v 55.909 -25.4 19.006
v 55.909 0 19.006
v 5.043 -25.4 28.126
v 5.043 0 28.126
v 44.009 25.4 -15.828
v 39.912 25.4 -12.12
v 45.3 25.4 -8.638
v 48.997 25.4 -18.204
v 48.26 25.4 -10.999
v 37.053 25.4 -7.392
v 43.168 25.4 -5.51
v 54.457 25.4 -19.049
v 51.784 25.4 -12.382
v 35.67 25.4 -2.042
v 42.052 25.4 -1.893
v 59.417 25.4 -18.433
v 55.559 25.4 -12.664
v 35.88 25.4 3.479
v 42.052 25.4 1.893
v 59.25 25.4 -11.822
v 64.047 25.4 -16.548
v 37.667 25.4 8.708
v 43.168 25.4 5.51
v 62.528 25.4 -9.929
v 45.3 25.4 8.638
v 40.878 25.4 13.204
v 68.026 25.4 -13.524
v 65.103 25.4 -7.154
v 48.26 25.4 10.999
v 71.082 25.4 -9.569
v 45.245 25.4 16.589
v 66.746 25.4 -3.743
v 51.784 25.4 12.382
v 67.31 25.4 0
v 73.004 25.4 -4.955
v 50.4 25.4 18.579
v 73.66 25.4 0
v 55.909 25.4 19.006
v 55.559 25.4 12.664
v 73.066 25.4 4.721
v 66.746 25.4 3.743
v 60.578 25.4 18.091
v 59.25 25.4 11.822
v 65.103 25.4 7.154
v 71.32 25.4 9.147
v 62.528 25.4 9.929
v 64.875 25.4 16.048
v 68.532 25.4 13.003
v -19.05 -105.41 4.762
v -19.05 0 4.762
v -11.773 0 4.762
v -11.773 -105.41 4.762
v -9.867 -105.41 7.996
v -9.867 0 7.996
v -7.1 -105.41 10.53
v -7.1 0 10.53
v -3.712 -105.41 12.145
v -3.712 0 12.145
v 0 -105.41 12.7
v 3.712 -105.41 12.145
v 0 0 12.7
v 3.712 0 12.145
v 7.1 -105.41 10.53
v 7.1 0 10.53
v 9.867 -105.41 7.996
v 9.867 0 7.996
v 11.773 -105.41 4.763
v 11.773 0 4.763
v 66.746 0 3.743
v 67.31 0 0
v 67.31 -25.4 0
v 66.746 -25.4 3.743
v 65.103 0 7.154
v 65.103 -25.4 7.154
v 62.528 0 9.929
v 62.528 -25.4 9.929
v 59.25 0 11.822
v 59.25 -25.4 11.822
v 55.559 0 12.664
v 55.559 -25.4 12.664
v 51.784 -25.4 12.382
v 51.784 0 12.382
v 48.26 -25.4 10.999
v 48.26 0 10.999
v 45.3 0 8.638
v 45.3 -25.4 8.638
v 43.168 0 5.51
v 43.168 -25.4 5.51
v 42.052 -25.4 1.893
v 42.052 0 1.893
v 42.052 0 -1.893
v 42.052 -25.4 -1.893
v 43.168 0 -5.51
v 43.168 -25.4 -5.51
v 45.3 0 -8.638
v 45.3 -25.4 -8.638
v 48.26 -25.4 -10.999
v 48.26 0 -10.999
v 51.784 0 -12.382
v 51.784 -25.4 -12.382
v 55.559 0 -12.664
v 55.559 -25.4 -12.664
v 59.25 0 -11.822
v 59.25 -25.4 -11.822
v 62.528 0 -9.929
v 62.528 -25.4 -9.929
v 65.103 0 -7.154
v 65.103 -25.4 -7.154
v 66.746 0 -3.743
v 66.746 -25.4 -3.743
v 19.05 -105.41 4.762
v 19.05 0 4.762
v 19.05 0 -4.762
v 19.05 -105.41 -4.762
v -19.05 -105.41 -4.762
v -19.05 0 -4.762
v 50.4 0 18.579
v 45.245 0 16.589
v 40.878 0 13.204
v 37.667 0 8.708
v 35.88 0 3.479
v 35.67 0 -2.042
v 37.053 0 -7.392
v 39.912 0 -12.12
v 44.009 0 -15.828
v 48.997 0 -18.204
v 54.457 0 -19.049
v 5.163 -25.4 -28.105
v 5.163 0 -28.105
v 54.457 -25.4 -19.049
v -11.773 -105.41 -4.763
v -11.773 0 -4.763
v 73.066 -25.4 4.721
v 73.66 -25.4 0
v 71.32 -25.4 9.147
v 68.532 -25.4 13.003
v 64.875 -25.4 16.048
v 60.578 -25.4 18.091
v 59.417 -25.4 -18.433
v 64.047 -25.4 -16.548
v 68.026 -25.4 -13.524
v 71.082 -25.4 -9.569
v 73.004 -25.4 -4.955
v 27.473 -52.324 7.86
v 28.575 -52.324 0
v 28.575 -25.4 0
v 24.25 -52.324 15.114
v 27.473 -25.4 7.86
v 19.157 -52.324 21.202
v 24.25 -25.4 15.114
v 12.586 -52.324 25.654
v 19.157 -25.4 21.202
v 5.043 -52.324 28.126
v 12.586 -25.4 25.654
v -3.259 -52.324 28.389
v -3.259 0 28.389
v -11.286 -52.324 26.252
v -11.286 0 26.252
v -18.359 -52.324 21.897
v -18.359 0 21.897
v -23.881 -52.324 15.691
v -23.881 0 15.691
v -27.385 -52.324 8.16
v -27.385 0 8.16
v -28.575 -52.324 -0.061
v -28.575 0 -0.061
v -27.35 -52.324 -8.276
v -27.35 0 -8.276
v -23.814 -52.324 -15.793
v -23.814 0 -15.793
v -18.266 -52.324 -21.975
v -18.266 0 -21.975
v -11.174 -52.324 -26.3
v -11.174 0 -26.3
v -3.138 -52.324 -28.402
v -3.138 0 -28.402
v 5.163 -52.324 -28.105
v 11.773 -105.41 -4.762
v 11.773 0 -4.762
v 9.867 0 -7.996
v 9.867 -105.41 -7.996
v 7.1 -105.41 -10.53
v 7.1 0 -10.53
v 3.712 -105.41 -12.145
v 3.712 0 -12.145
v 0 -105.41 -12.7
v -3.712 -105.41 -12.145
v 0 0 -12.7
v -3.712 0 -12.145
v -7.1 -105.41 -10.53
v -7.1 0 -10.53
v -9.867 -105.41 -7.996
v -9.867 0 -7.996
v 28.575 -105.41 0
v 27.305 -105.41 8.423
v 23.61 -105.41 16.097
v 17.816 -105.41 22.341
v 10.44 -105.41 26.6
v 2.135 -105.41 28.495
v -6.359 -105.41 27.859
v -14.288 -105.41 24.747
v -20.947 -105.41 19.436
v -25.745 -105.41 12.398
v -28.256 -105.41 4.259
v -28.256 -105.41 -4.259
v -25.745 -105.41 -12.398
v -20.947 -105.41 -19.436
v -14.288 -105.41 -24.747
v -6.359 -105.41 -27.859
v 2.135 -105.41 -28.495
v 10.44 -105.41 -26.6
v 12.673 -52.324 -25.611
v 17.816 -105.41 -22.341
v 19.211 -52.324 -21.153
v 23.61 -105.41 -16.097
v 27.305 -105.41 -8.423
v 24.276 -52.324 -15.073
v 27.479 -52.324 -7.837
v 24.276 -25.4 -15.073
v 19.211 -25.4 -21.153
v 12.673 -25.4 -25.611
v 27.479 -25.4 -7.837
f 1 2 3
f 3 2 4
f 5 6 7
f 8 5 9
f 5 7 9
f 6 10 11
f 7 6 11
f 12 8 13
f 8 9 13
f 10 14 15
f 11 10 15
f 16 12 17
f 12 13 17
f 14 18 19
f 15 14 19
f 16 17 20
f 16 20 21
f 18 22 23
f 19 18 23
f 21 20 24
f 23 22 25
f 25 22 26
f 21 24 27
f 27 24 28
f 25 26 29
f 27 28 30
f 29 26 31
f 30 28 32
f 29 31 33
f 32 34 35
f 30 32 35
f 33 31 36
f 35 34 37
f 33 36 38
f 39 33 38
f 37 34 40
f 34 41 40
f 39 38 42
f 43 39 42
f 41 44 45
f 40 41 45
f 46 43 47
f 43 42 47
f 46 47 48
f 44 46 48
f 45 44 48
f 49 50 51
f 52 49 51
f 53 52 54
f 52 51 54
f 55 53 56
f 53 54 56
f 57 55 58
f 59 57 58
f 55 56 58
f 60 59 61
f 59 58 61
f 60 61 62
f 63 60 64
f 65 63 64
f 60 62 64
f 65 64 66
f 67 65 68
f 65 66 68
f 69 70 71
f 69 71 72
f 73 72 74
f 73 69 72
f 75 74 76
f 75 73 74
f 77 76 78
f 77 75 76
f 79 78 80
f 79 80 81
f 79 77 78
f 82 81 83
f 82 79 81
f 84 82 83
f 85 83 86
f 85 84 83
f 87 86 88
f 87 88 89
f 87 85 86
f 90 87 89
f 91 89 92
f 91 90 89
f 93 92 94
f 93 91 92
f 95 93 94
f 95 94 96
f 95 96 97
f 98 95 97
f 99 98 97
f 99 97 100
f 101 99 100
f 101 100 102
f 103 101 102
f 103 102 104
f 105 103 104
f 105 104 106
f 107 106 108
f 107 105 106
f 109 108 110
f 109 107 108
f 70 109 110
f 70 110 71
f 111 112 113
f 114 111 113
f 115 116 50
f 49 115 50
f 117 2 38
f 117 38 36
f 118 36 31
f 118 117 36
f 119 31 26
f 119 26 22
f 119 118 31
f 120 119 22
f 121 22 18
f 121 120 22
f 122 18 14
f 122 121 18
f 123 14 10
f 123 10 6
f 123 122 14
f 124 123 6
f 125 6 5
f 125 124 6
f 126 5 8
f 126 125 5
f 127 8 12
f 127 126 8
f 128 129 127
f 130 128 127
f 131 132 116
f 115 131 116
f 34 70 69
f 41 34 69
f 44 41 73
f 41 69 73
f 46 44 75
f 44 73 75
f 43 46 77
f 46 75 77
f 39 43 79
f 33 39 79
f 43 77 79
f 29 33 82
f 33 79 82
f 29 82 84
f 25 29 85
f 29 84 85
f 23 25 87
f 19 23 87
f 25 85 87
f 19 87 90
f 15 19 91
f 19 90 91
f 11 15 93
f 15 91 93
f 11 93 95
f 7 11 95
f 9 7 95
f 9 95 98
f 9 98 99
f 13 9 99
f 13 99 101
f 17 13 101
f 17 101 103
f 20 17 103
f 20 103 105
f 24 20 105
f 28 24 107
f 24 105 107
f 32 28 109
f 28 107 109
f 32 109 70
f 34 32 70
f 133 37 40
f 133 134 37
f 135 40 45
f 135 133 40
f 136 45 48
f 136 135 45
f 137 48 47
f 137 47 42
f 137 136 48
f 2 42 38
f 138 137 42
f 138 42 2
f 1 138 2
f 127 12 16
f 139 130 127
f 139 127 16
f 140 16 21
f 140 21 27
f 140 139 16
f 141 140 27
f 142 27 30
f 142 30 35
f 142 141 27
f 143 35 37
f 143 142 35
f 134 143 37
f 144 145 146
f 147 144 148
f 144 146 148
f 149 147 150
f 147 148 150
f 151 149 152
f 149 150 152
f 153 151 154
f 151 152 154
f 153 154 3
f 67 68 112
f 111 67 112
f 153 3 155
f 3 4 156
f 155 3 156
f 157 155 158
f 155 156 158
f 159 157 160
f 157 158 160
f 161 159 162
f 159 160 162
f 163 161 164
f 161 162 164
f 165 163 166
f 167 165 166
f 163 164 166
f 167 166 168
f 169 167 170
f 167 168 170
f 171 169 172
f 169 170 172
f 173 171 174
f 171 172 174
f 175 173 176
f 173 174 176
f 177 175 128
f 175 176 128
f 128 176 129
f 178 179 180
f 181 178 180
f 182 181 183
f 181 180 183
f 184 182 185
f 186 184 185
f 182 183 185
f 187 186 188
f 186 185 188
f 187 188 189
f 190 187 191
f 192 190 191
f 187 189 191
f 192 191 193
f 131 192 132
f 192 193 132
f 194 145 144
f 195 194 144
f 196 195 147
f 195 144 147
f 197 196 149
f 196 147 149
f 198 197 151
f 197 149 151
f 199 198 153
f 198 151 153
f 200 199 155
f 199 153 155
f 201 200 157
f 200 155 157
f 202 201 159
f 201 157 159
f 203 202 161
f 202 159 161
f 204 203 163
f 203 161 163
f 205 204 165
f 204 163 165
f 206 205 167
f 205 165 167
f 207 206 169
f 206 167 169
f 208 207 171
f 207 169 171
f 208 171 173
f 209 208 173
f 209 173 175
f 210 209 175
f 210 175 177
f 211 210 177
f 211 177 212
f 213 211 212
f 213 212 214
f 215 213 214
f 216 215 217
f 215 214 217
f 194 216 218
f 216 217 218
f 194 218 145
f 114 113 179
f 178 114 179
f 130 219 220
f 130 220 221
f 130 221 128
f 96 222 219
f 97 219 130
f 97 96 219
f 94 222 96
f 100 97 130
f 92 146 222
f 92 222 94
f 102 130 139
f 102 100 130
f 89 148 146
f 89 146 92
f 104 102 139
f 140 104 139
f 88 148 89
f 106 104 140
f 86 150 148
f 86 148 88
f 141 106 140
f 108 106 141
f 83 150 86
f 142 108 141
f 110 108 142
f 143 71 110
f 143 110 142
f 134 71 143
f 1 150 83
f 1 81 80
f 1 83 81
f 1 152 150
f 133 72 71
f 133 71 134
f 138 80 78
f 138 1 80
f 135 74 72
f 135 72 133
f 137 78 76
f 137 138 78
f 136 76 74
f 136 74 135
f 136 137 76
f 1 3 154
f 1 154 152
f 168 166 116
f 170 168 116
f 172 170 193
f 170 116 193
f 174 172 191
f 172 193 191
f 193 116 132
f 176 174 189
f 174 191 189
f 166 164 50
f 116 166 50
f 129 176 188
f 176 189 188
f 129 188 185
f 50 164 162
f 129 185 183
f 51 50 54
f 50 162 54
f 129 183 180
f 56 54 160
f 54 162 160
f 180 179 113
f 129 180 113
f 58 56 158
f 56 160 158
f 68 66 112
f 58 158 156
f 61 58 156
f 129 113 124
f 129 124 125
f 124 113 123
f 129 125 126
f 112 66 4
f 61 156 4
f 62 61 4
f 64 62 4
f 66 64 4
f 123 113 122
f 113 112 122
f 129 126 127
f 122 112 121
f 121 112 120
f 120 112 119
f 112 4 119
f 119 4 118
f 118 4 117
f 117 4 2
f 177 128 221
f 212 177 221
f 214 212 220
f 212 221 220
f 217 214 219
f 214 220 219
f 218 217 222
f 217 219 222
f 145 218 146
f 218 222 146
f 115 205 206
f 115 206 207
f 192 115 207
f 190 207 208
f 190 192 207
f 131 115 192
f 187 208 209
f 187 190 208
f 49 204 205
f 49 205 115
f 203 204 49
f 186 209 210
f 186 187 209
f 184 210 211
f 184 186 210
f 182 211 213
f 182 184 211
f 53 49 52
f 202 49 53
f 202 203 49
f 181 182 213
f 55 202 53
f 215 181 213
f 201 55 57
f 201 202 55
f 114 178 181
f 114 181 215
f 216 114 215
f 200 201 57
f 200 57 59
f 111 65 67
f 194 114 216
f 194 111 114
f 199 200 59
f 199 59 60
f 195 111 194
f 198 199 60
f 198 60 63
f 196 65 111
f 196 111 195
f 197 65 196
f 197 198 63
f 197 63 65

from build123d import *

# Parameters (mm, degrees)
F0_R      = 12.7
F1_DEPTH  = 25.4
F2_DEPTH  = 52.324
F2_FACE_R = 28.575
F3_DEPTH  = 53.086
F4_DEPTH  = 25.4


with BuildPart() as f1:
    # F0 (on Front) → F1 (new body)
    with BuildSketch(Plane.XZ):
        with BuildLine():
            ThreePointArc((73.66, 0), (68.532063, 13.003025), (55.908961, 19.005662))
            ThreePointArc((55.908961, 19.005662), (35.573845, 0.726161), (54.457296, -19.049388))
            ThreePointArc((54.457296, -19.049388), (68.026287, -13.524265), (73.66, 0))
        make_face()
        with Locations((54.61, 0)):
            Circle(F0_R, mode=Mode.SUBTRACT)
        with BuildLine():
            ThreePointArc((5.16281, -28.104733), (21.955158, -18.289387), (28.575, 0))
            ThreePointArc((28.575, 0), (21.91626, 18.33598), (5.043369, 28.126412))
            ThreePointArc((5.043369, 28.126412), (-28.574936, -0.060696), (5.16281, -28.104733))
        make_face()
        with BuildLine():
            ThreePointArc((-11.773215, 4.7625), (0, 12.7), (11.773215, 4.7625))
            Line((11.773215, 4.7625), (19.05, 4.7625))
            Line((19.05, 4.7625), (19.05, -4.7625))
            Line((19.05, -4.7625), (11.773215, -4.7625))
            ThreePointArc((11.773215, -4.7625), (0, -12.7), (-11.773215, -4.7625))
            Line((-11.773215, -4.7625), (-19.05, -4.7625))
            Line((-19.05, -4.7625), (-19.05, 4.7625))
            Line((-19.05, 4.7625), (-11.773215, 4.7625))
        make_face(mode=Mode.SUBTRACT)
        with BuildLine():
            ThreePointArc((5.043369, 28.126412), (21.91626, 18.33598), (28.575, 0))
            ThreePointArc((28.575, 0), (21.955158, -18.289387), (5.16281, -28.104733))
            Line((5.16281, -28.104733), (54.457296, -19.049388))
            ThreePointArc((54.457296, -19.049388), (35.573845, 0.726161), (55.908961, 19.005662))
            Line((55.908961, 19.005662), (5.043369, 28.126412))
        make_face()
    extrude(amount=F1_DEPTH)

    # F0 (on Front) → F2 (join)
    with BuildSketch(Plane.XZ):
        with BuildLine():
            ThreePointArc((5.16281, -28.104733), (21.955158, -18.289387), (28.575, 0))
            ThreePointArc((28.575, 0), (21.91626, 18.33598), (5.043369, 28.126412))
            ThreePointArc((5.043369, 28.126412), (-28.574936, -0.060696), (5.16281, -28.104733))
        make_face()
        with BuildLine():
            ThreePointArc((-11.773215, 4.7625), (0, 12.7), (11.773215, 4.7625))
            Line((11.773215, 4.7625), (19.05, 4.7625))
            Line((19.05, 4.7625), (19.05, -4.7625))
            Line((19.05, -4.7625), (11.773215, -4.7625))
            ThreePointArc((11.773215, -4.7625), (0, -12.7), (-11.773215, -4.7625))
            Line((-11.773215, -4.7625), (-19.05, -4.7625))
            Line((-19.05, -4.7625), (-19.05, 4.7625))
            Line((-19.05, 4.7625), (-11.773215, 4.7625))
        make_face(mode=Mode.SUBTRACT)
    extrude(amount=F2_DEPTH)

    # F2_face (on face) → F3 (join)
    with BuildSketch(Plane.XZ.offset(52.324)):
        Circle(F2_FACE_R)
        with BuildLine():
            ThreePointArc((-11.773215, 4.7625), (0, 12.7), (11.773215, 4.7625))
            Line((11.773215, 4.7625), (19.05, 4.7625))
            Line((19.05, 4.7625), (19.05, -4.7625))
            Line((19.05, -4.7625), (11.773215, -4.7625))
            ThreePointArc((11.773215, -4.7625), (0, -12.7), (-11.773215, -4.7625))
            Line((-11.773215, -4.7625), (-19.05, -4.7625))
            Line((-19.05, -4.7625), (-19.05, 4.7625))
            Line((-19.05, 4.7625), (-11.773215, 4.7625))
        make_face(mode=Mode.SUBTRACT)
    extrude(amount=F3_DEPTH)

    # F0 (on Front) → F4 (join)
    with BuildSketch(Plane.XZ):
        with BuildLine():
            ThreePointArc((73.66, 0), (68.532063, 13.003025), (55.908961, 19.005662))
            ThreePointArc((55.908961, 19.005662), (35.573845, 0.726161), (54.457296, -19.049388))
            ThreePointArc((54.457296, -19.049388), (68.026287, -13.524265), (73.66, 0))
        make_face()
        with Locations((54.61, 0)):
            Circle(F0_R, mode=Mode.SUBTRACT)
    extrude(amount=-F4_DEPTH)


solid = f1.part
